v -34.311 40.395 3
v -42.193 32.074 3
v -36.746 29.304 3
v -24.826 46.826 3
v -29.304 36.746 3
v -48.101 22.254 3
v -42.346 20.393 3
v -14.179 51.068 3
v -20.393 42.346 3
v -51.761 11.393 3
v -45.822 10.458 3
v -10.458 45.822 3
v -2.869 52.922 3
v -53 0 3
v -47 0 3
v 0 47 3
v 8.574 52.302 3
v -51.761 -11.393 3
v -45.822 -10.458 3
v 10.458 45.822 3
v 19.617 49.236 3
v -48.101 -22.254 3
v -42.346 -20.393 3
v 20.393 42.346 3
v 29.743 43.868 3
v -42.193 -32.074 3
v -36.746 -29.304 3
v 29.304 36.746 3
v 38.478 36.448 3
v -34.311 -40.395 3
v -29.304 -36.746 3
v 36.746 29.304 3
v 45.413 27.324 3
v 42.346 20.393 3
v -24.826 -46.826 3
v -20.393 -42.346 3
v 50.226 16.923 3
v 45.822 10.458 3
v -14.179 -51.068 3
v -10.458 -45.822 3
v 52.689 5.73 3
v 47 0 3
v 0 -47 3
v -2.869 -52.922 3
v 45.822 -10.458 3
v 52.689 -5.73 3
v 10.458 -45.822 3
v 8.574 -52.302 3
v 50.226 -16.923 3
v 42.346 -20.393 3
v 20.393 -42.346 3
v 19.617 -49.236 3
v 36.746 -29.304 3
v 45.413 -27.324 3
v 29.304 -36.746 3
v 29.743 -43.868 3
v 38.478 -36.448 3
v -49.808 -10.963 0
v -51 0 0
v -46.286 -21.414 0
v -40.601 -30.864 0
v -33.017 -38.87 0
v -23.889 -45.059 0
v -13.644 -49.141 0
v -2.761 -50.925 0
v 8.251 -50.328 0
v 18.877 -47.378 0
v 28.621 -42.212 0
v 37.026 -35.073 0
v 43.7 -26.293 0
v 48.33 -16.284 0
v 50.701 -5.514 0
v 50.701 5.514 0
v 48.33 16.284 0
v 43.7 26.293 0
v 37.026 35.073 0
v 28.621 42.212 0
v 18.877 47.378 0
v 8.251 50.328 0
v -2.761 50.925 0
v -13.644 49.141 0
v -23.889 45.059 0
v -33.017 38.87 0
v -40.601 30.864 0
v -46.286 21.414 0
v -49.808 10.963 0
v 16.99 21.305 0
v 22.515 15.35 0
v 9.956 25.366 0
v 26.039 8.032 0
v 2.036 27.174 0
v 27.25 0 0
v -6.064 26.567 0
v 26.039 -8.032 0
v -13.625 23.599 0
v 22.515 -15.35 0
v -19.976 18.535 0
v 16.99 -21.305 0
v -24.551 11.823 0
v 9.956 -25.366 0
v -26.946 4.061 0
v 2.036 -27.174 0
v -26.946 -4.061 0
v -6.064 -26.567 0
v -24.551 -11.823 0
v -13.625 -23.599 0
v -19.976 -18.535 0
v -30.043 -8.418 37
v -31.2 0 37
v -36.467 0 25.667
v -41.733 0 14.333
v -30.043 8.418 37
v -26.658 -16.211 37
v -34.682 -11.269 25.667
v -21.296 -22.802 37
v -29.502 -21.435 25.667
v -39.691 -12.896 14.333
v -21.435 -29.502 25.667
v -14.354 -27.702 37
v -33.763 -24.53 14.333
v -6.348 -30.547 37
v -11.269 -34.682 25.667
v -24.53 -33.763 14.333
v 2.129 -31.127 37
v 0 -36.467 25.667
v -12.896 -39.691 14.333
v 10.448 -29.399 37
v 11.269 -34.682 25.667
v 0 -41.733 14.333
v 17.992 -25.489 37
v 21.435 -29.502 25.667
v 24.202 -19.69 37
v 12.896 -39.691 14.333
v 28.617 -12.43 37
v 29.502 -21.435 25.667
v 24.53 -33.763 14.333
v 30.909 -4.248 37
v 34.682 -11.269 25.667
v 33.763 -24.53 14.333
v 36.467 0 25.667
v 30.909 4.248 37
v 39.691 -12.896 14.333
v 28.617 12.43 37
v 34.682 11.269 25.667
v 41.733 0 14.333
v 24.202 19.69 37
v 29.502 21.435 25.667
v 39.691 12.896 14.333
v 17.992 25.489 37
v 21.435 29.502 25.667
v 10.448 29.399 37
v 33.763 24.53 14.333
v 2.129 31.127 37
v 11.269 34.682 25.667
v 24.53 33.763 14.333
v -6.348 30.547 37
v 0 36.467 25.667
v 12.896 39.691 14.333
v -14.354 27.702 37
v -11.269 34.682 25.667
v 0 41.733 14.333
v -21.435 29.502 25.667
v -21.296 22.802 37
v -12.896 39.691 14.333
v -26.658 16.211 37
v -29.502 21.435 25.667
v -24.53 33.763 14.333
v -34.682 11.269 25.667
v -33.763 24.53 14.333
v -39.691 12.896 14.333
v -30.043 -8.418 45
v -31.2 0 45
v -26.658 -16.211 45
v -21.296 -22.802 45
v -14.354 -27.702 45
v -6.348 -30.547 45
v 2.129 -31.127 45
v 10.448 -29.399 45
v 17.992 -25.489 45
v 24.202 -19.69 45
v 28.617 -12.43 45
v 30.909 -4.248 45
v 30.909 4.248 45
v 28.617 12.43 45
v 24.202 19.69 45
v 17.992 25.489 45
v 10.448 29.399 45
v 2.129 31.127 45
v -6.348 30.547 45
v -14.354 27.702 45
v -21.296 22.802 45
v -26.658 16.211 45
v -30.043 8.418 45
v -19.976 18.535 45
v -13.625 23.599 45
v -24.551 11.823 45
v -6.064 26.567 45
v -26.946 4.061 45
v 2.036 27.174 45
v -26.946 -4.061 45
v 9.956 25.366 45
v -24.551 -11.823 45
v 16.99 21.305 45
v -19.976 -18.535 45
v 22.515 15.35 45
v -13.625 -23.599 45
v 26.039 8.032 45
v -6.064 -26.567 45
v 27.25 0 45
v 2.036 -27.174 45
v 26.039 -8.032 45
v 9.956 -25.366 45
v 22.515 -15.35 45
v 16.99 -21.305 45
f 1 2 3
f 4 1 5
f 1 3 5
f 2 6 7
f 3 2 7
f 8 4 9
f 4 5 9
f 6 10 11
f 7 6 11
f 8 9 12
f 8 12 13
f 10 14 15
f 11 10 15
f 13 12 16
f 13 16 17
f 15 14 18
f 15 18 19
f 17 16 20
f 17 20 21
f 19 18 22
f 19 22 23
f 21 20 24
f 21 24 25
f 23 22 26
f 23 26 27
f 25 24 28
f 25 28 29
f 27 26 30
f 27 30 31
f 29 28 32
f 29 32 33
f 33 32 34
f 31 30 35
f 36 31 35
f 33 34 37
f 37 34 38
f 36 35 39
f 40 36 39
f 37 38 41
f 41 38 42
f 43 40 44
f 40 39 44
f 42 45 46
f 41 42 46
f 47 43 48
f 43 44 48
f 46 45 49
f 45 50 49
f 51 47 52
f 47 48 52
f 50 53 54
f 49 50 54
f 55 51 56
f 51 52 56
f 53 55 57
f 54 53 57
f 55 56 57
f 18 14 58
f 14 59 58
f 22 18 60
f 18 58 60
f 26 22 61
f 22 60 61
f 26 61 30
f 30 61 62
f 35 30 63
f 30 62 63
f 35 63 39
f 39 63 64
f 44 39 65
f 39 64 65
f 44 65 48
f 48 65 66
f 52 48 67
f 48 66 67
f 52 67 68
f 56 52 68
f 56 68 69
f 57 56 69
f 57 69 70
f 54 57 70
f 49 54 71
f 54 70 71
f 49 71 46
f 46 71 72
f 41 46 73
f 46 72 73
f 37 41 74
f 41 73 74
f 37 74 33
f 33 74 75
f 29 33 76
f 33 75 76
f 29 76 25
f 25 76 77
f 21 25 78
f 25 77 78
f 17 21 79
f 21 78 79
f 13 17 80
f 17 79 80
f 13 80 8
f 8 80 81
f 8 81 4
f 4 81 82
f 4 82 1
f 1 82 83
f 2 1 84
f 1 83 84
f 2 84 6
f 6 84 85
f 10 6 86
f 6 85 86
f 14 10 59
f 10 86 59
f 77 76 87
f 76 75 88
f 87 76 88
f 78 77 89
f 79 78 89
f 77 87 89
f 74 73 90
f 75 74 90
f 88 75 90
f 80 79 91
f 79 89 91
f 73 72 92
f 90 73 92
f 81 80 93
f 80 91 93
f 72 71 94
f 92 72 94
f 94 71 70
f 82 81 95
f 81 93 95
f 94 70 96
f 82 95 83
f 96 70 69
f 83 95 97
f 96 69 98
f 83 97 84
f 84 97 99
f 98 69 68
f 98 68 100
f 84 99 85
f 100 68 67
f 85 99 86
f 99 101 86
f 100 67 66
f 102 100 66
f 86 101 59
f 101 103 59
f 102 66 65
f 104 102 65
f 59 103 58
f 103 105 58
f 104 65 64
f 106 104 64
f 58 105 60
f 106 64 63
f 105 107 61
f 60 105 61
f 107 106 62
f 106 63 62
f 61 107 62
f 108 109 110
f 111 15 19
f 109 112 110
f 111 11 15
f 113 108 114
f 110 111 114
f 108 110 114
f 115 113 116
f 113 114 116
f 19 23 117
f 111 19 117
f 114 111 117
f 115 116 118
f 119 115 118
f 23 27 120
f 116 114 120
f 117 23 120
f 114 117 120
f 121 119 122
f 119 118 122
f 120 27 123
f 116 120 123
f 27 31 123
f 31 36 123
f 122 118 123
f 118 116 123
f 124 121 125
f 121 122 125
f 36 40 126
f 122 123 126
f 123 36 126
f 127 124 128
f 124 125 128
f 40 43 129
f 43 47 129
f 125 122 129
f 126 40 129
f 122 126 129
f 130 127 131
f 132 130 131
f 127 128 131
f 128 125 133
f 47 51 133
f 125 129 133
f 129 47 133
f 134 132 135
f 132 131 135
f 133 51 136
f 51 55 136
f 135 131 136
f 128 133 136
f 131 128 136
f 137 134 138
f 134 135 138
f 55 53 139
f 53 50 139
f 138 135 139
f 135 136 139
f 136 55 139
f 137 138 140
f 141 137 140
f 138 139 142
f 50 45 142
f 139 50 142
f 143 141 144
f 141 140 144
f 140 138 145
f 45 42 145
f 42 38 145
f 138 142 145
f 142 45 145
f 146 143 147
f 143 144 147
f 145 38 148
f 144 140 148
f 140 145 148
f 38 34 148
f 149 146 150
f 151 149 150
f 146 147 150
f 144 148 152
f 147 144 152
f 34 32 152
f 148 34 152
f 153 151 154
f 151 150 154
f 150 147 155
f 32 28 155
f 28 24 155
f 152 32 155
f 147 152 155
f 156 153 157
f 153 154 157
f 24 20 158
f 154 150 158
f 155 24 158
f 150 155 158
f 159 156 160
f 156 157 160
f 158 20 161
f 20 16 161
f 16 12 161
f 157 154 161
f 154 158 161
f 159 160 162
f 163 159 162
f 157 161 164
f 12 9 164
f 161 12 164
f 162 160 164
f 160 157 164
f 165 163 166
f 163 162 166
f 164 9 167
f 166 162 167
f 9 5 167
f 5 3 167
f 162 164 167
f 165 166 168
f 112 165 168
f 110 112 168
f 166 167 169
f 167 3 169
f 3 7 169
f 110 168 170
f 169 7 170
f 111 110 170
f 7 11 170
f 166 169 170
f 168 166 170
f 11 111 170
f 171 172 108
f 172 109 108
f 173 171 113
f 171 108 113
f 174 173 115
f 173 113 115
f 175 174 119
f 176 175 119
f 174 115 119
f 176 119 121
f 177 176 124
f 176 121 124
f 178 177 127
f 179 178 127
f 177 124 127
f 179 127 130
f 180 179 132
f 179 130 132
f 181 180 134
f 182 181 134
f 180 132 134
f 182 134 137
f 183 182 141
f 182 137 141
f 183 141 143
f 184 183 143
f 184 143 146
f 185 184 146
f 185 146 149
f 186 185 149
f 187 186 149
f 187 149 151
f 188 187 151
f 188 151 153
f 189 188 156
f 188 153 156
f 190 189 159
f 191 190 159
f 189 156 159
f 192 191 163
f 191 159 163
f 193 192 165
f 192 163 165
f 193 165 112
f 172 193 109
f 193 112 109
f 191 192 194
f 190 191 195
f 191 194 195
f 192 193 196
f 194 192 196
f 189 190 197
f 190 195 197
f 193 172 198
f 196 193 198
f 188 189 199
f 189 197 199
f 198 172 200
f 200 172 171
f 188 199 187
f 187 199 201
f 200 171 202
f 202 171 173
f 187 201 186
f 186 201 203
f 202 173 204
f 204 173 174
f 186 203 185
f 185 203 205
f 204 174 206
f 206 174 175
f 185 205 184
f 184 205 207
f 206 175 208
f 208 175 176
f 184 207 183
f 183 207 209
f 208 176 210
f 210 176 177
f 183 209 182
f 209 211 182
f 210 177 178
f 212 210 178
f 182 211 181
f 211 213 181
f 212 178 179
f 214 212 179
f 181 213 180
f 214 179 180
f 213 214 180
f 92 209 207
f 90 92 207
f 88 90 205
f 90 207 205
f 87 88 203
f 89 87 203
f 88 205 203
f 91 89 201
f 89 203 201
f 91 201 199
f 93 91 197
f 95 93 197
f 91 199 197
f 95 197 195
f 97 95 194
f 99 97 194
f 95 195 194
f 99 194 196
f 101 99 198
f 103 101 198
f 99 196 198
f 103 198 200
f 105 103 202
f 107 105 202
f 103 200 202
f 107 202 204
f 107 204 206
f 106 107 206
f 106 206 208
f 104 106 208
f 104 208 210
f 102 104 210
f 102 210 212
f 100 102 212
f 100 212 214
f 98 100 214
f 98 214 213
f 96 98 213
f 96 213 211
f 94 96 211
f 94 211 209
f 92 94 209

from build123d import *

# Parameters (mm, degrees)
F2_R     = 27.25
F3_DEPTH = 45.001


with BuildPart() as f1:
    # F0 (on Front) → F1 (revolve)
    with BuildSketch(Plane.XZ):
        Polygon((-51, 0), (0, 0), (0, 45), (-31.2, 45), (-31.2, 37), (-47, 3), (-53, 3), align=None)
    revolve(axis=Axis((0, 0, 22.5), (0, 0, 1)))

    # F2 (on face) → F3 (cut, through all)
    with BuildSketch(Plane.XY.offset(45)):
        Circle(F2_R)
    extrude(amount=-F3_DEPTH, mode=Mode.SUBTRACT)


solid = f1.part
